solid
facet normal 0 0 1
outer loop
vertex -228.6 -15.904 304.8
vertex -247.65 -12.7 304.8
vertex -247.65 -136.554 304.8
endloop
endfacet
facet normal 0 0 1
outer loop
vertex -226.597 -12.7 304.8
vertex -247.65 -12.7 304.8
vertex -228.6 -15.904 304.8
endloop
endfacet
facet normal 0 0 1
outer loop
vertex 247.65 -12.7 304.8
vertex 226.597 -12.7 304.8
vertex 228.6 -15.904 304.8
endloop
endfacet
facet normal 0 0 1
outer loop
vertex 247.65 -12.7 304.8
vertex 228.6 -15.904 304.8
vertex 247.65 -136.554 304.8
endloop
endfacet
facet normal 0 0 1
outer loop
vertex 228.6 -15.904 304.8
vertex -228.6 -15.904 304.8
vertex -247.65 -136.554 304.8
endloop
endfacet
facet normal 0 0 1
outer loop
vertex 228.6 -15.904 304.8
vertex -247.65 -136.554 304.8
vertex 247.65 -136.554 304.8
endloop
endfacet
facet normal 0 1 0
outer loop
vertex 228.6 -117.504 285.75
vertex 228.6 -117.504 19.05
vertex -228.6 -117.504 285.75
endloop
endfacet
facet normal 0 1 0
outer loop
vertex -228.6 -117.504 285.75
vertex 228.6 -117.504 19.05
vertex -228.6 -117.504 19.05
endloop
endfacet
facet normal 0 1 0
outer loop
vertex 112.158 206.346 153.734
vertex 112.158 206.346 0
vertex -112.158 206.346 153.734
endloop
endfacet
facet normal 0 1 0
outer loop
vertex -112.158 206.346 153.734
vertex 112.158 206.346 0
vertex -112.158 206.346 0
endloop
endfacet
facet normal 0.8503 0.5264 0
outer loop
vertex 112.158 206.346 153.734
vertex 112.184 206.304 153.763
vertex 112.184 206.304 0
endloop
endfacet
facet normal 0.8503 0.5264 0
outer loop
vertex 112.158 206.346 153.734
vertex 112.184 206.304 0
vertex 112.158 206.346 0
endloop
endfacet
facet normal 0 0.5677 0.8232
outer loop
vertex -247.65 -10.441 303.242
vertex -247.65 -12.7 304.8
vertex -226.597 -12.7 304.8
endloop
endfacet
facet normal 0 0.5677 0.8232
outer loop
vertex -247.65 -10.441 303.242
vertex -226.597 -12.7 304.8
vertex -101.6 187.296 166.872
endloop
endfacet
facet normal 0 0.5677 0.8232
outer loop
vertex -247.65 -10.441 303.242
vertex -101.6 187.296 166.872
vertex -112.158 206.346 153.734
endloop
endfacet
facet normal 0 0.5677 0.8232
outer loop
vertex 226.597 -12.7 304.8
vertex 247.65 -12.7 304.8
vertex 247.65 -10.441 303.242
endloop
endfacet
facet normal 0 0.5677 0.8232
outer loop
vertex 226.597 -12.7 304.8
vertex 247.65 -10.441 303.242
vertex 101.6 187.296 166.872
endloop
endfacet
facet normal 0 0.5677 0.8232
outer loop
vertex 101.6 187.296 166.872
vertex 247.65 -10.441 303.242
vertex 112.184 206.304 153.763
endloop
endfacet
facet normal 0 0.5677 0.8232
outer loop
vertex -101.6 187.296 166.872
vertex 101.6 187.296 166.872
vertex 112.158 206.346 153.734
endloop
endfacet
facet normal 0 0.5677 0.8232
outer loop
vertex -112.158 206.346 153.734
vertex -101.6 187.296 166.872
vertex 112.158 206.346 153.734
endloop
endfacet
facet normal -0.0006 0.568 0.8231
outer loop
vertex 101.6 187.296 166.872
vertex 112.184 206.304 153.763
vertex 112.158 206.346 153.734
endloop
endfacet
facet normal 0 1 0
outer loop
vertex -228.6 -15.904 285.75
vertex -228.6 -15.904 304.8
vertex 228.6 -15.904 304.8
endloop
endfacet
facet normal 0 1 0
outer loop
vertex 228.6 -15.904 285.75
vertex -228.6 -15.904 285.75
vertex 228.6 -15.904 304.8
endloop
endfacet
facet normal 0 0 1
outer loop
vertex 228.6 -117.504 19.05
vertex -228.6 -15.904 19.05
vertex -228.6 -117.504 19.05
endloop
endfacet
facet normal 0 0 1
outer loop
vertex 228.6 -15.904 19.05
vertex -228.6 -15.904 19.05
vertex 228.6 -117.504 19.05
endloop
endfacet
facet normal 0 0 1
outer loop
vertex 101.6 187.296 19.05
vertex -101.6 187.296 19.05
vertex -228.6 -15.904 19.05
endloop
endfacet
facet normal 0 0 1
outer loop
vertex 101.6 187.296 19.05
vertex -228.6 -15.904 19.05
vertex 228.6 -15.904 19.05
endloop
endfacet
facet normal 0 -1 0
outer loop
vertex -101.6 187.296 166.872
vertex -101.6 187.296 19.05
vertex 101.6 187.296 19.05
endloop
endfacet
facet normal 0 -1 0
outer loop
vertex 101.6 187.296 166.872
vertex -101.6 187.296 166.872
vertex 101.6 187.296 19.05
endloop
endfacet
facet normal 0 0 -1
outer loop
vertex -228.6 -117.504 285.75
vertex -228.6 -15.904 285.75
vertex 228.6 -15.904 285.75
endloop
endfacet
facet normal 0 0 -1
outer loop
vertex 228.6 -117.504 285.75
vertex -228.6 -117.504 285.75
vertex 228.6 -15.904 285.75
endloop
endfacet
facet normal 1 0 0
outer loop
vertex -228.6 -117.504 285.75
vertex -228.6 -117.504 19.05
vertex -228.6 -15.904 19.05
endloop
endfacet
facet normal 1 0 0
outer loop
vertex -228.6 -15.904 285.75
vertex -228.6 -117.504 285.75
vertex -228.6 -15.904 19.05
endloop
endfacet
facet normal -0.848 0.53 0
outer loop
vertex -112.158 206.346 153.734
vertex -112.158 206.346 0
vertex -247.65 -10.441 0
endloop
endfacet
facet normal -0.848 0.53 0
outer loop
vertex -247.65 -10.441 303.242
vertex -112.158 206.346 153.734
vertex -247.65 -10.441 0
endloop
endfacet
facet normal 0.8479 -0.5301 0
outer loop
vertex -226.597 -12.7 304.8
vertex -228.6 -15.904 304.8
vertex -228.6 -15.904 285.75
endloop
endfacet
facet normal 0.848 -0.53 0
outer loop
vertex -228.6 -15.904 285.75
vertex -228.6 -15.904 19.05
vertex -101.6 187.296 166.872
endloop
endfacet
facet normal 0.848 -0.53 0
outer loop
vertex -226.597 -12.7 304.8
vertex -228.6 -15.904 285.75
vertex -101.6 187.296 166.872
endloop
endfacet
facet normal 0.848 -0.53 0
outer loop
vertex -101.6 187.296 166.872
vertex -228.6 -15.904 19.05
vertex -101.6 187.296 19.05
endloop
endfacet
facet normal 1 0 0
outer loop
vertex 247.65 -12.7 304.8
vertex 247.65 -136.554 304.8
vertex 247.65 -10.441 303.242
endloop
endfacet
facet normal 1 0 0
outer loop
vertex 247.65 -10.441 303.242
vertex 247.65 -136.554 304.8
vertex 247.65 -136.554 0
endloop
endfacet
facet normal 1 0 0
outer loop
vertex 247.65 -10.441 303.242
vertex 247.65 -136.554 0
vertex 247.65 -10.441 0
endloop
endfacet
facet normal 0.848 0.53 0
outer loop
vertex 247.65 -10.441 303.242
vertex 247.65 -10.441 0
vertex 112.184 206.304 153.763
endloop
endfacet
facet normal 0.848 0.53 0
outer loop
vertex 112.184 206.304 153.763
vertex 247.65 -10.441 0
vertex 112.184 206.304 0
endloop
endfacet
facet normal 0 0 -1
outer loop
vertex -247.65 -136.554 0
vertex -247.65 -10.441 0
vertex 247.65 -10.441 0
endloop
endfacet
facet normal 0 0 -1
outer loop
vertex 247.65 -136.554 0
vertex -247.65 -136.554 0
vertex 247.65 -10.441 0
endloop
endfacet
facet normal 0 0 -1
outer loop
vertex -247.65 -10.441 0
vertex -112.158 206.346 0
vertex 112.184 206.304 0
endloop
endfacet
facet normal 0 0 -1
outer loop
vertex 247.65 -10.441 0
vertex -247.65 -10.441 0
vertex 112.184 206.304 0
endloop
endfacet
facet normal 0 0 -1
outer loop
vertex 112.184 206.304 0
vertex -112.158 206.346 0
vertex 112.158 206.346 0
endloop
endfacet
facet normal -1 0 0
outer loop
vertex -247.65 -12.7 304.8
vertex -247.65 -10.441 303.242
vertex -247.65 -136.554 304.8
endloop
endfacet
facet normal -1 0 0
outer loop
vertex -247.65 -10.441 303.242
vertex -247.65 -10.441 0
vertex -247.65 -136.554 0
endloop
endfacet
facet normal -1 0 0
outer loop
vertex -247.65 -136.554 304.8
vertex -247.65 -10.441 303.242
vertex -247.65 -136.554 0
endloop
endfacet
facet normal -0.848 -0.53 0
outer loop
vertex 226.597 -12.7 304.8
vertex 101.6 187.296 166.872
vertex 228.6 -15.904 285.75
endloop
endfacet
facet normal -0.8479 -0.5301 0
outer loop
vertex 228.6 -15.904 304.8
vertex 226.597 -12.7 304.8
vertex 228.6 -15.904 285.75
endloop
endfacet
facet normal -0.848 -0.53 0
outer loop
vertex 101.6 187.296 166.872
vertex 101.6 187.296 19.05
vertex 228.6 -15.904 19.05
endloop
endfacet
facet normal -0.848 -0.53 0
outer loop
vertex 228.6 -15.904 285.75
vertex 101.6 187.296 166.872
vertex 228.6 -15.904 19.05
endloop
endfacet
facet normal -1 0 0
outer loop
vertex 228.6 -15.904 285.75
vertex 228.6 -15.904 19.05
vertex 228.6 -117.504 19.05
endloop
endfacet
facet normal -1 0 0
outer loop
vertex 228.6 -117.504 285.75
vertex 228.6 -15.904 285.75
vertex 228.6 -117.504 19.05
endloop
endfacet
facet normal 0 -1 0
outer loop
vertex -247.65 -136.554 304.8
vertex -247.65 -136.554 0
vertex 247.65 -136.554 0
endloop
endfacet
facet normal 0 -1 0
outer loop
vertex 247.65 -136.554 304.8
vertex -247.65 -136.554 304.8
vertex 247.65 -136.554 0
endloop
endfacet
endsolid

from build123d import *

# Parameters (mm, degrees)
F1_DEPTH  = 177.8
F2_DEPTH  = 304.8
F3_DEPTH  = 304.8
F4_DEPTH  = 304.8
F5_DEPTH  = 304.8
F6_DEPTH  = 304.8
F7_DEPTH  = 19.05
F9_DEPTH  = 304.8
F10_W     = 495.3
F10_H     = 120.65
F11_DEPTH = 19.05


with BuildPart() as f1:
    # F0 (on Top) → F1 (new body)
    with BuildSketch(Plane.XY):
        Polygon((-112.158418, 206.345618), (-101.6, 187.295618), (101.6, 187.295618), (112.184372, 206.304091), (112.158418, 206.345618), align=None)
    extrude(amount=F1_DEPTH)

    # F0 (on Top) → F2 (join)
    with BuildSketch(Plane.XY):
        Polygon((-247.65, -10.440914), (-228.6, -15.904382), (-101.6, 187.295618), (-112.158418, 206.345618), align=None)
    extrude(amount=F2_DEPTH)

    # F0 (on Top) → F3 (join)
    with BuildSketch(Plane.XY):
        Polygon((101.6, 187.295618), (228.6, -15.904382), (247.65, -10.440914), (112.184372, 206.304091), align=None)
    extrude(amount=F3_DEPTH)

    # F0 (on Top) → F4 (join)
    with BuildSketch(Plane.XY):
        Polygon((-247.65, -136.554382), (-228.6, -117.504382), (-228.6, -15.904382), (-247.65, -10.440914), align=None)
    extrude(amount=F4_DEPTH)

    # F0 (on Top) → F5 (join)
    with BuildSketch(Plane.XY):
        Polygon((228.6, -15.904382), (228.6, -117.504382), (247.65, -136.554382), (247.65, -10.440914), align=None)
    extrude(amount=F5_DEPTH)

    # F0 (on Top) → F6 (join)
    with BuildSketch(Plane.XY):
        Polygon((228.6, -117.504382), (-228.6, -117.504382), (-247.65, -136.554382), (247.65, -136.554382), align=None)
    extrude(amount=F6_DEPTH)

    # F0 (on Top) → F7 (join)
    with BuildSketch(Plane.XY):
        Polygon((-228.6, -15.904382), (-228.6, -117.504382), (228.6, -117.504382), (228.6, -15.904382), (101.6, 187.295618), (-101.6, 187.295618), align=None)
    extrude(amount=F7_DEPTH)

    # F8 (on Right) → F9 (cut, symmetric)
    with BuildSketch(Plane.YZ):
        Polygon((-12.7, 311.536975), (-12.7, 304.8), (208.28, 152.4), (208.28, 311.536975), align=None)
    extrude(amount=F9_DEPTH, both=True, mode=Mode.SUBTRACT)

    # F10 (on face) → F11 (join)
    with BuildSketch(Plane.XY.offset(304.8)):
        with Locations((0, -76.229382)):
            Rectangle(F10_W, F10_H)
    extrude(amount=-F11_DEPTH)


solid = f1.part
